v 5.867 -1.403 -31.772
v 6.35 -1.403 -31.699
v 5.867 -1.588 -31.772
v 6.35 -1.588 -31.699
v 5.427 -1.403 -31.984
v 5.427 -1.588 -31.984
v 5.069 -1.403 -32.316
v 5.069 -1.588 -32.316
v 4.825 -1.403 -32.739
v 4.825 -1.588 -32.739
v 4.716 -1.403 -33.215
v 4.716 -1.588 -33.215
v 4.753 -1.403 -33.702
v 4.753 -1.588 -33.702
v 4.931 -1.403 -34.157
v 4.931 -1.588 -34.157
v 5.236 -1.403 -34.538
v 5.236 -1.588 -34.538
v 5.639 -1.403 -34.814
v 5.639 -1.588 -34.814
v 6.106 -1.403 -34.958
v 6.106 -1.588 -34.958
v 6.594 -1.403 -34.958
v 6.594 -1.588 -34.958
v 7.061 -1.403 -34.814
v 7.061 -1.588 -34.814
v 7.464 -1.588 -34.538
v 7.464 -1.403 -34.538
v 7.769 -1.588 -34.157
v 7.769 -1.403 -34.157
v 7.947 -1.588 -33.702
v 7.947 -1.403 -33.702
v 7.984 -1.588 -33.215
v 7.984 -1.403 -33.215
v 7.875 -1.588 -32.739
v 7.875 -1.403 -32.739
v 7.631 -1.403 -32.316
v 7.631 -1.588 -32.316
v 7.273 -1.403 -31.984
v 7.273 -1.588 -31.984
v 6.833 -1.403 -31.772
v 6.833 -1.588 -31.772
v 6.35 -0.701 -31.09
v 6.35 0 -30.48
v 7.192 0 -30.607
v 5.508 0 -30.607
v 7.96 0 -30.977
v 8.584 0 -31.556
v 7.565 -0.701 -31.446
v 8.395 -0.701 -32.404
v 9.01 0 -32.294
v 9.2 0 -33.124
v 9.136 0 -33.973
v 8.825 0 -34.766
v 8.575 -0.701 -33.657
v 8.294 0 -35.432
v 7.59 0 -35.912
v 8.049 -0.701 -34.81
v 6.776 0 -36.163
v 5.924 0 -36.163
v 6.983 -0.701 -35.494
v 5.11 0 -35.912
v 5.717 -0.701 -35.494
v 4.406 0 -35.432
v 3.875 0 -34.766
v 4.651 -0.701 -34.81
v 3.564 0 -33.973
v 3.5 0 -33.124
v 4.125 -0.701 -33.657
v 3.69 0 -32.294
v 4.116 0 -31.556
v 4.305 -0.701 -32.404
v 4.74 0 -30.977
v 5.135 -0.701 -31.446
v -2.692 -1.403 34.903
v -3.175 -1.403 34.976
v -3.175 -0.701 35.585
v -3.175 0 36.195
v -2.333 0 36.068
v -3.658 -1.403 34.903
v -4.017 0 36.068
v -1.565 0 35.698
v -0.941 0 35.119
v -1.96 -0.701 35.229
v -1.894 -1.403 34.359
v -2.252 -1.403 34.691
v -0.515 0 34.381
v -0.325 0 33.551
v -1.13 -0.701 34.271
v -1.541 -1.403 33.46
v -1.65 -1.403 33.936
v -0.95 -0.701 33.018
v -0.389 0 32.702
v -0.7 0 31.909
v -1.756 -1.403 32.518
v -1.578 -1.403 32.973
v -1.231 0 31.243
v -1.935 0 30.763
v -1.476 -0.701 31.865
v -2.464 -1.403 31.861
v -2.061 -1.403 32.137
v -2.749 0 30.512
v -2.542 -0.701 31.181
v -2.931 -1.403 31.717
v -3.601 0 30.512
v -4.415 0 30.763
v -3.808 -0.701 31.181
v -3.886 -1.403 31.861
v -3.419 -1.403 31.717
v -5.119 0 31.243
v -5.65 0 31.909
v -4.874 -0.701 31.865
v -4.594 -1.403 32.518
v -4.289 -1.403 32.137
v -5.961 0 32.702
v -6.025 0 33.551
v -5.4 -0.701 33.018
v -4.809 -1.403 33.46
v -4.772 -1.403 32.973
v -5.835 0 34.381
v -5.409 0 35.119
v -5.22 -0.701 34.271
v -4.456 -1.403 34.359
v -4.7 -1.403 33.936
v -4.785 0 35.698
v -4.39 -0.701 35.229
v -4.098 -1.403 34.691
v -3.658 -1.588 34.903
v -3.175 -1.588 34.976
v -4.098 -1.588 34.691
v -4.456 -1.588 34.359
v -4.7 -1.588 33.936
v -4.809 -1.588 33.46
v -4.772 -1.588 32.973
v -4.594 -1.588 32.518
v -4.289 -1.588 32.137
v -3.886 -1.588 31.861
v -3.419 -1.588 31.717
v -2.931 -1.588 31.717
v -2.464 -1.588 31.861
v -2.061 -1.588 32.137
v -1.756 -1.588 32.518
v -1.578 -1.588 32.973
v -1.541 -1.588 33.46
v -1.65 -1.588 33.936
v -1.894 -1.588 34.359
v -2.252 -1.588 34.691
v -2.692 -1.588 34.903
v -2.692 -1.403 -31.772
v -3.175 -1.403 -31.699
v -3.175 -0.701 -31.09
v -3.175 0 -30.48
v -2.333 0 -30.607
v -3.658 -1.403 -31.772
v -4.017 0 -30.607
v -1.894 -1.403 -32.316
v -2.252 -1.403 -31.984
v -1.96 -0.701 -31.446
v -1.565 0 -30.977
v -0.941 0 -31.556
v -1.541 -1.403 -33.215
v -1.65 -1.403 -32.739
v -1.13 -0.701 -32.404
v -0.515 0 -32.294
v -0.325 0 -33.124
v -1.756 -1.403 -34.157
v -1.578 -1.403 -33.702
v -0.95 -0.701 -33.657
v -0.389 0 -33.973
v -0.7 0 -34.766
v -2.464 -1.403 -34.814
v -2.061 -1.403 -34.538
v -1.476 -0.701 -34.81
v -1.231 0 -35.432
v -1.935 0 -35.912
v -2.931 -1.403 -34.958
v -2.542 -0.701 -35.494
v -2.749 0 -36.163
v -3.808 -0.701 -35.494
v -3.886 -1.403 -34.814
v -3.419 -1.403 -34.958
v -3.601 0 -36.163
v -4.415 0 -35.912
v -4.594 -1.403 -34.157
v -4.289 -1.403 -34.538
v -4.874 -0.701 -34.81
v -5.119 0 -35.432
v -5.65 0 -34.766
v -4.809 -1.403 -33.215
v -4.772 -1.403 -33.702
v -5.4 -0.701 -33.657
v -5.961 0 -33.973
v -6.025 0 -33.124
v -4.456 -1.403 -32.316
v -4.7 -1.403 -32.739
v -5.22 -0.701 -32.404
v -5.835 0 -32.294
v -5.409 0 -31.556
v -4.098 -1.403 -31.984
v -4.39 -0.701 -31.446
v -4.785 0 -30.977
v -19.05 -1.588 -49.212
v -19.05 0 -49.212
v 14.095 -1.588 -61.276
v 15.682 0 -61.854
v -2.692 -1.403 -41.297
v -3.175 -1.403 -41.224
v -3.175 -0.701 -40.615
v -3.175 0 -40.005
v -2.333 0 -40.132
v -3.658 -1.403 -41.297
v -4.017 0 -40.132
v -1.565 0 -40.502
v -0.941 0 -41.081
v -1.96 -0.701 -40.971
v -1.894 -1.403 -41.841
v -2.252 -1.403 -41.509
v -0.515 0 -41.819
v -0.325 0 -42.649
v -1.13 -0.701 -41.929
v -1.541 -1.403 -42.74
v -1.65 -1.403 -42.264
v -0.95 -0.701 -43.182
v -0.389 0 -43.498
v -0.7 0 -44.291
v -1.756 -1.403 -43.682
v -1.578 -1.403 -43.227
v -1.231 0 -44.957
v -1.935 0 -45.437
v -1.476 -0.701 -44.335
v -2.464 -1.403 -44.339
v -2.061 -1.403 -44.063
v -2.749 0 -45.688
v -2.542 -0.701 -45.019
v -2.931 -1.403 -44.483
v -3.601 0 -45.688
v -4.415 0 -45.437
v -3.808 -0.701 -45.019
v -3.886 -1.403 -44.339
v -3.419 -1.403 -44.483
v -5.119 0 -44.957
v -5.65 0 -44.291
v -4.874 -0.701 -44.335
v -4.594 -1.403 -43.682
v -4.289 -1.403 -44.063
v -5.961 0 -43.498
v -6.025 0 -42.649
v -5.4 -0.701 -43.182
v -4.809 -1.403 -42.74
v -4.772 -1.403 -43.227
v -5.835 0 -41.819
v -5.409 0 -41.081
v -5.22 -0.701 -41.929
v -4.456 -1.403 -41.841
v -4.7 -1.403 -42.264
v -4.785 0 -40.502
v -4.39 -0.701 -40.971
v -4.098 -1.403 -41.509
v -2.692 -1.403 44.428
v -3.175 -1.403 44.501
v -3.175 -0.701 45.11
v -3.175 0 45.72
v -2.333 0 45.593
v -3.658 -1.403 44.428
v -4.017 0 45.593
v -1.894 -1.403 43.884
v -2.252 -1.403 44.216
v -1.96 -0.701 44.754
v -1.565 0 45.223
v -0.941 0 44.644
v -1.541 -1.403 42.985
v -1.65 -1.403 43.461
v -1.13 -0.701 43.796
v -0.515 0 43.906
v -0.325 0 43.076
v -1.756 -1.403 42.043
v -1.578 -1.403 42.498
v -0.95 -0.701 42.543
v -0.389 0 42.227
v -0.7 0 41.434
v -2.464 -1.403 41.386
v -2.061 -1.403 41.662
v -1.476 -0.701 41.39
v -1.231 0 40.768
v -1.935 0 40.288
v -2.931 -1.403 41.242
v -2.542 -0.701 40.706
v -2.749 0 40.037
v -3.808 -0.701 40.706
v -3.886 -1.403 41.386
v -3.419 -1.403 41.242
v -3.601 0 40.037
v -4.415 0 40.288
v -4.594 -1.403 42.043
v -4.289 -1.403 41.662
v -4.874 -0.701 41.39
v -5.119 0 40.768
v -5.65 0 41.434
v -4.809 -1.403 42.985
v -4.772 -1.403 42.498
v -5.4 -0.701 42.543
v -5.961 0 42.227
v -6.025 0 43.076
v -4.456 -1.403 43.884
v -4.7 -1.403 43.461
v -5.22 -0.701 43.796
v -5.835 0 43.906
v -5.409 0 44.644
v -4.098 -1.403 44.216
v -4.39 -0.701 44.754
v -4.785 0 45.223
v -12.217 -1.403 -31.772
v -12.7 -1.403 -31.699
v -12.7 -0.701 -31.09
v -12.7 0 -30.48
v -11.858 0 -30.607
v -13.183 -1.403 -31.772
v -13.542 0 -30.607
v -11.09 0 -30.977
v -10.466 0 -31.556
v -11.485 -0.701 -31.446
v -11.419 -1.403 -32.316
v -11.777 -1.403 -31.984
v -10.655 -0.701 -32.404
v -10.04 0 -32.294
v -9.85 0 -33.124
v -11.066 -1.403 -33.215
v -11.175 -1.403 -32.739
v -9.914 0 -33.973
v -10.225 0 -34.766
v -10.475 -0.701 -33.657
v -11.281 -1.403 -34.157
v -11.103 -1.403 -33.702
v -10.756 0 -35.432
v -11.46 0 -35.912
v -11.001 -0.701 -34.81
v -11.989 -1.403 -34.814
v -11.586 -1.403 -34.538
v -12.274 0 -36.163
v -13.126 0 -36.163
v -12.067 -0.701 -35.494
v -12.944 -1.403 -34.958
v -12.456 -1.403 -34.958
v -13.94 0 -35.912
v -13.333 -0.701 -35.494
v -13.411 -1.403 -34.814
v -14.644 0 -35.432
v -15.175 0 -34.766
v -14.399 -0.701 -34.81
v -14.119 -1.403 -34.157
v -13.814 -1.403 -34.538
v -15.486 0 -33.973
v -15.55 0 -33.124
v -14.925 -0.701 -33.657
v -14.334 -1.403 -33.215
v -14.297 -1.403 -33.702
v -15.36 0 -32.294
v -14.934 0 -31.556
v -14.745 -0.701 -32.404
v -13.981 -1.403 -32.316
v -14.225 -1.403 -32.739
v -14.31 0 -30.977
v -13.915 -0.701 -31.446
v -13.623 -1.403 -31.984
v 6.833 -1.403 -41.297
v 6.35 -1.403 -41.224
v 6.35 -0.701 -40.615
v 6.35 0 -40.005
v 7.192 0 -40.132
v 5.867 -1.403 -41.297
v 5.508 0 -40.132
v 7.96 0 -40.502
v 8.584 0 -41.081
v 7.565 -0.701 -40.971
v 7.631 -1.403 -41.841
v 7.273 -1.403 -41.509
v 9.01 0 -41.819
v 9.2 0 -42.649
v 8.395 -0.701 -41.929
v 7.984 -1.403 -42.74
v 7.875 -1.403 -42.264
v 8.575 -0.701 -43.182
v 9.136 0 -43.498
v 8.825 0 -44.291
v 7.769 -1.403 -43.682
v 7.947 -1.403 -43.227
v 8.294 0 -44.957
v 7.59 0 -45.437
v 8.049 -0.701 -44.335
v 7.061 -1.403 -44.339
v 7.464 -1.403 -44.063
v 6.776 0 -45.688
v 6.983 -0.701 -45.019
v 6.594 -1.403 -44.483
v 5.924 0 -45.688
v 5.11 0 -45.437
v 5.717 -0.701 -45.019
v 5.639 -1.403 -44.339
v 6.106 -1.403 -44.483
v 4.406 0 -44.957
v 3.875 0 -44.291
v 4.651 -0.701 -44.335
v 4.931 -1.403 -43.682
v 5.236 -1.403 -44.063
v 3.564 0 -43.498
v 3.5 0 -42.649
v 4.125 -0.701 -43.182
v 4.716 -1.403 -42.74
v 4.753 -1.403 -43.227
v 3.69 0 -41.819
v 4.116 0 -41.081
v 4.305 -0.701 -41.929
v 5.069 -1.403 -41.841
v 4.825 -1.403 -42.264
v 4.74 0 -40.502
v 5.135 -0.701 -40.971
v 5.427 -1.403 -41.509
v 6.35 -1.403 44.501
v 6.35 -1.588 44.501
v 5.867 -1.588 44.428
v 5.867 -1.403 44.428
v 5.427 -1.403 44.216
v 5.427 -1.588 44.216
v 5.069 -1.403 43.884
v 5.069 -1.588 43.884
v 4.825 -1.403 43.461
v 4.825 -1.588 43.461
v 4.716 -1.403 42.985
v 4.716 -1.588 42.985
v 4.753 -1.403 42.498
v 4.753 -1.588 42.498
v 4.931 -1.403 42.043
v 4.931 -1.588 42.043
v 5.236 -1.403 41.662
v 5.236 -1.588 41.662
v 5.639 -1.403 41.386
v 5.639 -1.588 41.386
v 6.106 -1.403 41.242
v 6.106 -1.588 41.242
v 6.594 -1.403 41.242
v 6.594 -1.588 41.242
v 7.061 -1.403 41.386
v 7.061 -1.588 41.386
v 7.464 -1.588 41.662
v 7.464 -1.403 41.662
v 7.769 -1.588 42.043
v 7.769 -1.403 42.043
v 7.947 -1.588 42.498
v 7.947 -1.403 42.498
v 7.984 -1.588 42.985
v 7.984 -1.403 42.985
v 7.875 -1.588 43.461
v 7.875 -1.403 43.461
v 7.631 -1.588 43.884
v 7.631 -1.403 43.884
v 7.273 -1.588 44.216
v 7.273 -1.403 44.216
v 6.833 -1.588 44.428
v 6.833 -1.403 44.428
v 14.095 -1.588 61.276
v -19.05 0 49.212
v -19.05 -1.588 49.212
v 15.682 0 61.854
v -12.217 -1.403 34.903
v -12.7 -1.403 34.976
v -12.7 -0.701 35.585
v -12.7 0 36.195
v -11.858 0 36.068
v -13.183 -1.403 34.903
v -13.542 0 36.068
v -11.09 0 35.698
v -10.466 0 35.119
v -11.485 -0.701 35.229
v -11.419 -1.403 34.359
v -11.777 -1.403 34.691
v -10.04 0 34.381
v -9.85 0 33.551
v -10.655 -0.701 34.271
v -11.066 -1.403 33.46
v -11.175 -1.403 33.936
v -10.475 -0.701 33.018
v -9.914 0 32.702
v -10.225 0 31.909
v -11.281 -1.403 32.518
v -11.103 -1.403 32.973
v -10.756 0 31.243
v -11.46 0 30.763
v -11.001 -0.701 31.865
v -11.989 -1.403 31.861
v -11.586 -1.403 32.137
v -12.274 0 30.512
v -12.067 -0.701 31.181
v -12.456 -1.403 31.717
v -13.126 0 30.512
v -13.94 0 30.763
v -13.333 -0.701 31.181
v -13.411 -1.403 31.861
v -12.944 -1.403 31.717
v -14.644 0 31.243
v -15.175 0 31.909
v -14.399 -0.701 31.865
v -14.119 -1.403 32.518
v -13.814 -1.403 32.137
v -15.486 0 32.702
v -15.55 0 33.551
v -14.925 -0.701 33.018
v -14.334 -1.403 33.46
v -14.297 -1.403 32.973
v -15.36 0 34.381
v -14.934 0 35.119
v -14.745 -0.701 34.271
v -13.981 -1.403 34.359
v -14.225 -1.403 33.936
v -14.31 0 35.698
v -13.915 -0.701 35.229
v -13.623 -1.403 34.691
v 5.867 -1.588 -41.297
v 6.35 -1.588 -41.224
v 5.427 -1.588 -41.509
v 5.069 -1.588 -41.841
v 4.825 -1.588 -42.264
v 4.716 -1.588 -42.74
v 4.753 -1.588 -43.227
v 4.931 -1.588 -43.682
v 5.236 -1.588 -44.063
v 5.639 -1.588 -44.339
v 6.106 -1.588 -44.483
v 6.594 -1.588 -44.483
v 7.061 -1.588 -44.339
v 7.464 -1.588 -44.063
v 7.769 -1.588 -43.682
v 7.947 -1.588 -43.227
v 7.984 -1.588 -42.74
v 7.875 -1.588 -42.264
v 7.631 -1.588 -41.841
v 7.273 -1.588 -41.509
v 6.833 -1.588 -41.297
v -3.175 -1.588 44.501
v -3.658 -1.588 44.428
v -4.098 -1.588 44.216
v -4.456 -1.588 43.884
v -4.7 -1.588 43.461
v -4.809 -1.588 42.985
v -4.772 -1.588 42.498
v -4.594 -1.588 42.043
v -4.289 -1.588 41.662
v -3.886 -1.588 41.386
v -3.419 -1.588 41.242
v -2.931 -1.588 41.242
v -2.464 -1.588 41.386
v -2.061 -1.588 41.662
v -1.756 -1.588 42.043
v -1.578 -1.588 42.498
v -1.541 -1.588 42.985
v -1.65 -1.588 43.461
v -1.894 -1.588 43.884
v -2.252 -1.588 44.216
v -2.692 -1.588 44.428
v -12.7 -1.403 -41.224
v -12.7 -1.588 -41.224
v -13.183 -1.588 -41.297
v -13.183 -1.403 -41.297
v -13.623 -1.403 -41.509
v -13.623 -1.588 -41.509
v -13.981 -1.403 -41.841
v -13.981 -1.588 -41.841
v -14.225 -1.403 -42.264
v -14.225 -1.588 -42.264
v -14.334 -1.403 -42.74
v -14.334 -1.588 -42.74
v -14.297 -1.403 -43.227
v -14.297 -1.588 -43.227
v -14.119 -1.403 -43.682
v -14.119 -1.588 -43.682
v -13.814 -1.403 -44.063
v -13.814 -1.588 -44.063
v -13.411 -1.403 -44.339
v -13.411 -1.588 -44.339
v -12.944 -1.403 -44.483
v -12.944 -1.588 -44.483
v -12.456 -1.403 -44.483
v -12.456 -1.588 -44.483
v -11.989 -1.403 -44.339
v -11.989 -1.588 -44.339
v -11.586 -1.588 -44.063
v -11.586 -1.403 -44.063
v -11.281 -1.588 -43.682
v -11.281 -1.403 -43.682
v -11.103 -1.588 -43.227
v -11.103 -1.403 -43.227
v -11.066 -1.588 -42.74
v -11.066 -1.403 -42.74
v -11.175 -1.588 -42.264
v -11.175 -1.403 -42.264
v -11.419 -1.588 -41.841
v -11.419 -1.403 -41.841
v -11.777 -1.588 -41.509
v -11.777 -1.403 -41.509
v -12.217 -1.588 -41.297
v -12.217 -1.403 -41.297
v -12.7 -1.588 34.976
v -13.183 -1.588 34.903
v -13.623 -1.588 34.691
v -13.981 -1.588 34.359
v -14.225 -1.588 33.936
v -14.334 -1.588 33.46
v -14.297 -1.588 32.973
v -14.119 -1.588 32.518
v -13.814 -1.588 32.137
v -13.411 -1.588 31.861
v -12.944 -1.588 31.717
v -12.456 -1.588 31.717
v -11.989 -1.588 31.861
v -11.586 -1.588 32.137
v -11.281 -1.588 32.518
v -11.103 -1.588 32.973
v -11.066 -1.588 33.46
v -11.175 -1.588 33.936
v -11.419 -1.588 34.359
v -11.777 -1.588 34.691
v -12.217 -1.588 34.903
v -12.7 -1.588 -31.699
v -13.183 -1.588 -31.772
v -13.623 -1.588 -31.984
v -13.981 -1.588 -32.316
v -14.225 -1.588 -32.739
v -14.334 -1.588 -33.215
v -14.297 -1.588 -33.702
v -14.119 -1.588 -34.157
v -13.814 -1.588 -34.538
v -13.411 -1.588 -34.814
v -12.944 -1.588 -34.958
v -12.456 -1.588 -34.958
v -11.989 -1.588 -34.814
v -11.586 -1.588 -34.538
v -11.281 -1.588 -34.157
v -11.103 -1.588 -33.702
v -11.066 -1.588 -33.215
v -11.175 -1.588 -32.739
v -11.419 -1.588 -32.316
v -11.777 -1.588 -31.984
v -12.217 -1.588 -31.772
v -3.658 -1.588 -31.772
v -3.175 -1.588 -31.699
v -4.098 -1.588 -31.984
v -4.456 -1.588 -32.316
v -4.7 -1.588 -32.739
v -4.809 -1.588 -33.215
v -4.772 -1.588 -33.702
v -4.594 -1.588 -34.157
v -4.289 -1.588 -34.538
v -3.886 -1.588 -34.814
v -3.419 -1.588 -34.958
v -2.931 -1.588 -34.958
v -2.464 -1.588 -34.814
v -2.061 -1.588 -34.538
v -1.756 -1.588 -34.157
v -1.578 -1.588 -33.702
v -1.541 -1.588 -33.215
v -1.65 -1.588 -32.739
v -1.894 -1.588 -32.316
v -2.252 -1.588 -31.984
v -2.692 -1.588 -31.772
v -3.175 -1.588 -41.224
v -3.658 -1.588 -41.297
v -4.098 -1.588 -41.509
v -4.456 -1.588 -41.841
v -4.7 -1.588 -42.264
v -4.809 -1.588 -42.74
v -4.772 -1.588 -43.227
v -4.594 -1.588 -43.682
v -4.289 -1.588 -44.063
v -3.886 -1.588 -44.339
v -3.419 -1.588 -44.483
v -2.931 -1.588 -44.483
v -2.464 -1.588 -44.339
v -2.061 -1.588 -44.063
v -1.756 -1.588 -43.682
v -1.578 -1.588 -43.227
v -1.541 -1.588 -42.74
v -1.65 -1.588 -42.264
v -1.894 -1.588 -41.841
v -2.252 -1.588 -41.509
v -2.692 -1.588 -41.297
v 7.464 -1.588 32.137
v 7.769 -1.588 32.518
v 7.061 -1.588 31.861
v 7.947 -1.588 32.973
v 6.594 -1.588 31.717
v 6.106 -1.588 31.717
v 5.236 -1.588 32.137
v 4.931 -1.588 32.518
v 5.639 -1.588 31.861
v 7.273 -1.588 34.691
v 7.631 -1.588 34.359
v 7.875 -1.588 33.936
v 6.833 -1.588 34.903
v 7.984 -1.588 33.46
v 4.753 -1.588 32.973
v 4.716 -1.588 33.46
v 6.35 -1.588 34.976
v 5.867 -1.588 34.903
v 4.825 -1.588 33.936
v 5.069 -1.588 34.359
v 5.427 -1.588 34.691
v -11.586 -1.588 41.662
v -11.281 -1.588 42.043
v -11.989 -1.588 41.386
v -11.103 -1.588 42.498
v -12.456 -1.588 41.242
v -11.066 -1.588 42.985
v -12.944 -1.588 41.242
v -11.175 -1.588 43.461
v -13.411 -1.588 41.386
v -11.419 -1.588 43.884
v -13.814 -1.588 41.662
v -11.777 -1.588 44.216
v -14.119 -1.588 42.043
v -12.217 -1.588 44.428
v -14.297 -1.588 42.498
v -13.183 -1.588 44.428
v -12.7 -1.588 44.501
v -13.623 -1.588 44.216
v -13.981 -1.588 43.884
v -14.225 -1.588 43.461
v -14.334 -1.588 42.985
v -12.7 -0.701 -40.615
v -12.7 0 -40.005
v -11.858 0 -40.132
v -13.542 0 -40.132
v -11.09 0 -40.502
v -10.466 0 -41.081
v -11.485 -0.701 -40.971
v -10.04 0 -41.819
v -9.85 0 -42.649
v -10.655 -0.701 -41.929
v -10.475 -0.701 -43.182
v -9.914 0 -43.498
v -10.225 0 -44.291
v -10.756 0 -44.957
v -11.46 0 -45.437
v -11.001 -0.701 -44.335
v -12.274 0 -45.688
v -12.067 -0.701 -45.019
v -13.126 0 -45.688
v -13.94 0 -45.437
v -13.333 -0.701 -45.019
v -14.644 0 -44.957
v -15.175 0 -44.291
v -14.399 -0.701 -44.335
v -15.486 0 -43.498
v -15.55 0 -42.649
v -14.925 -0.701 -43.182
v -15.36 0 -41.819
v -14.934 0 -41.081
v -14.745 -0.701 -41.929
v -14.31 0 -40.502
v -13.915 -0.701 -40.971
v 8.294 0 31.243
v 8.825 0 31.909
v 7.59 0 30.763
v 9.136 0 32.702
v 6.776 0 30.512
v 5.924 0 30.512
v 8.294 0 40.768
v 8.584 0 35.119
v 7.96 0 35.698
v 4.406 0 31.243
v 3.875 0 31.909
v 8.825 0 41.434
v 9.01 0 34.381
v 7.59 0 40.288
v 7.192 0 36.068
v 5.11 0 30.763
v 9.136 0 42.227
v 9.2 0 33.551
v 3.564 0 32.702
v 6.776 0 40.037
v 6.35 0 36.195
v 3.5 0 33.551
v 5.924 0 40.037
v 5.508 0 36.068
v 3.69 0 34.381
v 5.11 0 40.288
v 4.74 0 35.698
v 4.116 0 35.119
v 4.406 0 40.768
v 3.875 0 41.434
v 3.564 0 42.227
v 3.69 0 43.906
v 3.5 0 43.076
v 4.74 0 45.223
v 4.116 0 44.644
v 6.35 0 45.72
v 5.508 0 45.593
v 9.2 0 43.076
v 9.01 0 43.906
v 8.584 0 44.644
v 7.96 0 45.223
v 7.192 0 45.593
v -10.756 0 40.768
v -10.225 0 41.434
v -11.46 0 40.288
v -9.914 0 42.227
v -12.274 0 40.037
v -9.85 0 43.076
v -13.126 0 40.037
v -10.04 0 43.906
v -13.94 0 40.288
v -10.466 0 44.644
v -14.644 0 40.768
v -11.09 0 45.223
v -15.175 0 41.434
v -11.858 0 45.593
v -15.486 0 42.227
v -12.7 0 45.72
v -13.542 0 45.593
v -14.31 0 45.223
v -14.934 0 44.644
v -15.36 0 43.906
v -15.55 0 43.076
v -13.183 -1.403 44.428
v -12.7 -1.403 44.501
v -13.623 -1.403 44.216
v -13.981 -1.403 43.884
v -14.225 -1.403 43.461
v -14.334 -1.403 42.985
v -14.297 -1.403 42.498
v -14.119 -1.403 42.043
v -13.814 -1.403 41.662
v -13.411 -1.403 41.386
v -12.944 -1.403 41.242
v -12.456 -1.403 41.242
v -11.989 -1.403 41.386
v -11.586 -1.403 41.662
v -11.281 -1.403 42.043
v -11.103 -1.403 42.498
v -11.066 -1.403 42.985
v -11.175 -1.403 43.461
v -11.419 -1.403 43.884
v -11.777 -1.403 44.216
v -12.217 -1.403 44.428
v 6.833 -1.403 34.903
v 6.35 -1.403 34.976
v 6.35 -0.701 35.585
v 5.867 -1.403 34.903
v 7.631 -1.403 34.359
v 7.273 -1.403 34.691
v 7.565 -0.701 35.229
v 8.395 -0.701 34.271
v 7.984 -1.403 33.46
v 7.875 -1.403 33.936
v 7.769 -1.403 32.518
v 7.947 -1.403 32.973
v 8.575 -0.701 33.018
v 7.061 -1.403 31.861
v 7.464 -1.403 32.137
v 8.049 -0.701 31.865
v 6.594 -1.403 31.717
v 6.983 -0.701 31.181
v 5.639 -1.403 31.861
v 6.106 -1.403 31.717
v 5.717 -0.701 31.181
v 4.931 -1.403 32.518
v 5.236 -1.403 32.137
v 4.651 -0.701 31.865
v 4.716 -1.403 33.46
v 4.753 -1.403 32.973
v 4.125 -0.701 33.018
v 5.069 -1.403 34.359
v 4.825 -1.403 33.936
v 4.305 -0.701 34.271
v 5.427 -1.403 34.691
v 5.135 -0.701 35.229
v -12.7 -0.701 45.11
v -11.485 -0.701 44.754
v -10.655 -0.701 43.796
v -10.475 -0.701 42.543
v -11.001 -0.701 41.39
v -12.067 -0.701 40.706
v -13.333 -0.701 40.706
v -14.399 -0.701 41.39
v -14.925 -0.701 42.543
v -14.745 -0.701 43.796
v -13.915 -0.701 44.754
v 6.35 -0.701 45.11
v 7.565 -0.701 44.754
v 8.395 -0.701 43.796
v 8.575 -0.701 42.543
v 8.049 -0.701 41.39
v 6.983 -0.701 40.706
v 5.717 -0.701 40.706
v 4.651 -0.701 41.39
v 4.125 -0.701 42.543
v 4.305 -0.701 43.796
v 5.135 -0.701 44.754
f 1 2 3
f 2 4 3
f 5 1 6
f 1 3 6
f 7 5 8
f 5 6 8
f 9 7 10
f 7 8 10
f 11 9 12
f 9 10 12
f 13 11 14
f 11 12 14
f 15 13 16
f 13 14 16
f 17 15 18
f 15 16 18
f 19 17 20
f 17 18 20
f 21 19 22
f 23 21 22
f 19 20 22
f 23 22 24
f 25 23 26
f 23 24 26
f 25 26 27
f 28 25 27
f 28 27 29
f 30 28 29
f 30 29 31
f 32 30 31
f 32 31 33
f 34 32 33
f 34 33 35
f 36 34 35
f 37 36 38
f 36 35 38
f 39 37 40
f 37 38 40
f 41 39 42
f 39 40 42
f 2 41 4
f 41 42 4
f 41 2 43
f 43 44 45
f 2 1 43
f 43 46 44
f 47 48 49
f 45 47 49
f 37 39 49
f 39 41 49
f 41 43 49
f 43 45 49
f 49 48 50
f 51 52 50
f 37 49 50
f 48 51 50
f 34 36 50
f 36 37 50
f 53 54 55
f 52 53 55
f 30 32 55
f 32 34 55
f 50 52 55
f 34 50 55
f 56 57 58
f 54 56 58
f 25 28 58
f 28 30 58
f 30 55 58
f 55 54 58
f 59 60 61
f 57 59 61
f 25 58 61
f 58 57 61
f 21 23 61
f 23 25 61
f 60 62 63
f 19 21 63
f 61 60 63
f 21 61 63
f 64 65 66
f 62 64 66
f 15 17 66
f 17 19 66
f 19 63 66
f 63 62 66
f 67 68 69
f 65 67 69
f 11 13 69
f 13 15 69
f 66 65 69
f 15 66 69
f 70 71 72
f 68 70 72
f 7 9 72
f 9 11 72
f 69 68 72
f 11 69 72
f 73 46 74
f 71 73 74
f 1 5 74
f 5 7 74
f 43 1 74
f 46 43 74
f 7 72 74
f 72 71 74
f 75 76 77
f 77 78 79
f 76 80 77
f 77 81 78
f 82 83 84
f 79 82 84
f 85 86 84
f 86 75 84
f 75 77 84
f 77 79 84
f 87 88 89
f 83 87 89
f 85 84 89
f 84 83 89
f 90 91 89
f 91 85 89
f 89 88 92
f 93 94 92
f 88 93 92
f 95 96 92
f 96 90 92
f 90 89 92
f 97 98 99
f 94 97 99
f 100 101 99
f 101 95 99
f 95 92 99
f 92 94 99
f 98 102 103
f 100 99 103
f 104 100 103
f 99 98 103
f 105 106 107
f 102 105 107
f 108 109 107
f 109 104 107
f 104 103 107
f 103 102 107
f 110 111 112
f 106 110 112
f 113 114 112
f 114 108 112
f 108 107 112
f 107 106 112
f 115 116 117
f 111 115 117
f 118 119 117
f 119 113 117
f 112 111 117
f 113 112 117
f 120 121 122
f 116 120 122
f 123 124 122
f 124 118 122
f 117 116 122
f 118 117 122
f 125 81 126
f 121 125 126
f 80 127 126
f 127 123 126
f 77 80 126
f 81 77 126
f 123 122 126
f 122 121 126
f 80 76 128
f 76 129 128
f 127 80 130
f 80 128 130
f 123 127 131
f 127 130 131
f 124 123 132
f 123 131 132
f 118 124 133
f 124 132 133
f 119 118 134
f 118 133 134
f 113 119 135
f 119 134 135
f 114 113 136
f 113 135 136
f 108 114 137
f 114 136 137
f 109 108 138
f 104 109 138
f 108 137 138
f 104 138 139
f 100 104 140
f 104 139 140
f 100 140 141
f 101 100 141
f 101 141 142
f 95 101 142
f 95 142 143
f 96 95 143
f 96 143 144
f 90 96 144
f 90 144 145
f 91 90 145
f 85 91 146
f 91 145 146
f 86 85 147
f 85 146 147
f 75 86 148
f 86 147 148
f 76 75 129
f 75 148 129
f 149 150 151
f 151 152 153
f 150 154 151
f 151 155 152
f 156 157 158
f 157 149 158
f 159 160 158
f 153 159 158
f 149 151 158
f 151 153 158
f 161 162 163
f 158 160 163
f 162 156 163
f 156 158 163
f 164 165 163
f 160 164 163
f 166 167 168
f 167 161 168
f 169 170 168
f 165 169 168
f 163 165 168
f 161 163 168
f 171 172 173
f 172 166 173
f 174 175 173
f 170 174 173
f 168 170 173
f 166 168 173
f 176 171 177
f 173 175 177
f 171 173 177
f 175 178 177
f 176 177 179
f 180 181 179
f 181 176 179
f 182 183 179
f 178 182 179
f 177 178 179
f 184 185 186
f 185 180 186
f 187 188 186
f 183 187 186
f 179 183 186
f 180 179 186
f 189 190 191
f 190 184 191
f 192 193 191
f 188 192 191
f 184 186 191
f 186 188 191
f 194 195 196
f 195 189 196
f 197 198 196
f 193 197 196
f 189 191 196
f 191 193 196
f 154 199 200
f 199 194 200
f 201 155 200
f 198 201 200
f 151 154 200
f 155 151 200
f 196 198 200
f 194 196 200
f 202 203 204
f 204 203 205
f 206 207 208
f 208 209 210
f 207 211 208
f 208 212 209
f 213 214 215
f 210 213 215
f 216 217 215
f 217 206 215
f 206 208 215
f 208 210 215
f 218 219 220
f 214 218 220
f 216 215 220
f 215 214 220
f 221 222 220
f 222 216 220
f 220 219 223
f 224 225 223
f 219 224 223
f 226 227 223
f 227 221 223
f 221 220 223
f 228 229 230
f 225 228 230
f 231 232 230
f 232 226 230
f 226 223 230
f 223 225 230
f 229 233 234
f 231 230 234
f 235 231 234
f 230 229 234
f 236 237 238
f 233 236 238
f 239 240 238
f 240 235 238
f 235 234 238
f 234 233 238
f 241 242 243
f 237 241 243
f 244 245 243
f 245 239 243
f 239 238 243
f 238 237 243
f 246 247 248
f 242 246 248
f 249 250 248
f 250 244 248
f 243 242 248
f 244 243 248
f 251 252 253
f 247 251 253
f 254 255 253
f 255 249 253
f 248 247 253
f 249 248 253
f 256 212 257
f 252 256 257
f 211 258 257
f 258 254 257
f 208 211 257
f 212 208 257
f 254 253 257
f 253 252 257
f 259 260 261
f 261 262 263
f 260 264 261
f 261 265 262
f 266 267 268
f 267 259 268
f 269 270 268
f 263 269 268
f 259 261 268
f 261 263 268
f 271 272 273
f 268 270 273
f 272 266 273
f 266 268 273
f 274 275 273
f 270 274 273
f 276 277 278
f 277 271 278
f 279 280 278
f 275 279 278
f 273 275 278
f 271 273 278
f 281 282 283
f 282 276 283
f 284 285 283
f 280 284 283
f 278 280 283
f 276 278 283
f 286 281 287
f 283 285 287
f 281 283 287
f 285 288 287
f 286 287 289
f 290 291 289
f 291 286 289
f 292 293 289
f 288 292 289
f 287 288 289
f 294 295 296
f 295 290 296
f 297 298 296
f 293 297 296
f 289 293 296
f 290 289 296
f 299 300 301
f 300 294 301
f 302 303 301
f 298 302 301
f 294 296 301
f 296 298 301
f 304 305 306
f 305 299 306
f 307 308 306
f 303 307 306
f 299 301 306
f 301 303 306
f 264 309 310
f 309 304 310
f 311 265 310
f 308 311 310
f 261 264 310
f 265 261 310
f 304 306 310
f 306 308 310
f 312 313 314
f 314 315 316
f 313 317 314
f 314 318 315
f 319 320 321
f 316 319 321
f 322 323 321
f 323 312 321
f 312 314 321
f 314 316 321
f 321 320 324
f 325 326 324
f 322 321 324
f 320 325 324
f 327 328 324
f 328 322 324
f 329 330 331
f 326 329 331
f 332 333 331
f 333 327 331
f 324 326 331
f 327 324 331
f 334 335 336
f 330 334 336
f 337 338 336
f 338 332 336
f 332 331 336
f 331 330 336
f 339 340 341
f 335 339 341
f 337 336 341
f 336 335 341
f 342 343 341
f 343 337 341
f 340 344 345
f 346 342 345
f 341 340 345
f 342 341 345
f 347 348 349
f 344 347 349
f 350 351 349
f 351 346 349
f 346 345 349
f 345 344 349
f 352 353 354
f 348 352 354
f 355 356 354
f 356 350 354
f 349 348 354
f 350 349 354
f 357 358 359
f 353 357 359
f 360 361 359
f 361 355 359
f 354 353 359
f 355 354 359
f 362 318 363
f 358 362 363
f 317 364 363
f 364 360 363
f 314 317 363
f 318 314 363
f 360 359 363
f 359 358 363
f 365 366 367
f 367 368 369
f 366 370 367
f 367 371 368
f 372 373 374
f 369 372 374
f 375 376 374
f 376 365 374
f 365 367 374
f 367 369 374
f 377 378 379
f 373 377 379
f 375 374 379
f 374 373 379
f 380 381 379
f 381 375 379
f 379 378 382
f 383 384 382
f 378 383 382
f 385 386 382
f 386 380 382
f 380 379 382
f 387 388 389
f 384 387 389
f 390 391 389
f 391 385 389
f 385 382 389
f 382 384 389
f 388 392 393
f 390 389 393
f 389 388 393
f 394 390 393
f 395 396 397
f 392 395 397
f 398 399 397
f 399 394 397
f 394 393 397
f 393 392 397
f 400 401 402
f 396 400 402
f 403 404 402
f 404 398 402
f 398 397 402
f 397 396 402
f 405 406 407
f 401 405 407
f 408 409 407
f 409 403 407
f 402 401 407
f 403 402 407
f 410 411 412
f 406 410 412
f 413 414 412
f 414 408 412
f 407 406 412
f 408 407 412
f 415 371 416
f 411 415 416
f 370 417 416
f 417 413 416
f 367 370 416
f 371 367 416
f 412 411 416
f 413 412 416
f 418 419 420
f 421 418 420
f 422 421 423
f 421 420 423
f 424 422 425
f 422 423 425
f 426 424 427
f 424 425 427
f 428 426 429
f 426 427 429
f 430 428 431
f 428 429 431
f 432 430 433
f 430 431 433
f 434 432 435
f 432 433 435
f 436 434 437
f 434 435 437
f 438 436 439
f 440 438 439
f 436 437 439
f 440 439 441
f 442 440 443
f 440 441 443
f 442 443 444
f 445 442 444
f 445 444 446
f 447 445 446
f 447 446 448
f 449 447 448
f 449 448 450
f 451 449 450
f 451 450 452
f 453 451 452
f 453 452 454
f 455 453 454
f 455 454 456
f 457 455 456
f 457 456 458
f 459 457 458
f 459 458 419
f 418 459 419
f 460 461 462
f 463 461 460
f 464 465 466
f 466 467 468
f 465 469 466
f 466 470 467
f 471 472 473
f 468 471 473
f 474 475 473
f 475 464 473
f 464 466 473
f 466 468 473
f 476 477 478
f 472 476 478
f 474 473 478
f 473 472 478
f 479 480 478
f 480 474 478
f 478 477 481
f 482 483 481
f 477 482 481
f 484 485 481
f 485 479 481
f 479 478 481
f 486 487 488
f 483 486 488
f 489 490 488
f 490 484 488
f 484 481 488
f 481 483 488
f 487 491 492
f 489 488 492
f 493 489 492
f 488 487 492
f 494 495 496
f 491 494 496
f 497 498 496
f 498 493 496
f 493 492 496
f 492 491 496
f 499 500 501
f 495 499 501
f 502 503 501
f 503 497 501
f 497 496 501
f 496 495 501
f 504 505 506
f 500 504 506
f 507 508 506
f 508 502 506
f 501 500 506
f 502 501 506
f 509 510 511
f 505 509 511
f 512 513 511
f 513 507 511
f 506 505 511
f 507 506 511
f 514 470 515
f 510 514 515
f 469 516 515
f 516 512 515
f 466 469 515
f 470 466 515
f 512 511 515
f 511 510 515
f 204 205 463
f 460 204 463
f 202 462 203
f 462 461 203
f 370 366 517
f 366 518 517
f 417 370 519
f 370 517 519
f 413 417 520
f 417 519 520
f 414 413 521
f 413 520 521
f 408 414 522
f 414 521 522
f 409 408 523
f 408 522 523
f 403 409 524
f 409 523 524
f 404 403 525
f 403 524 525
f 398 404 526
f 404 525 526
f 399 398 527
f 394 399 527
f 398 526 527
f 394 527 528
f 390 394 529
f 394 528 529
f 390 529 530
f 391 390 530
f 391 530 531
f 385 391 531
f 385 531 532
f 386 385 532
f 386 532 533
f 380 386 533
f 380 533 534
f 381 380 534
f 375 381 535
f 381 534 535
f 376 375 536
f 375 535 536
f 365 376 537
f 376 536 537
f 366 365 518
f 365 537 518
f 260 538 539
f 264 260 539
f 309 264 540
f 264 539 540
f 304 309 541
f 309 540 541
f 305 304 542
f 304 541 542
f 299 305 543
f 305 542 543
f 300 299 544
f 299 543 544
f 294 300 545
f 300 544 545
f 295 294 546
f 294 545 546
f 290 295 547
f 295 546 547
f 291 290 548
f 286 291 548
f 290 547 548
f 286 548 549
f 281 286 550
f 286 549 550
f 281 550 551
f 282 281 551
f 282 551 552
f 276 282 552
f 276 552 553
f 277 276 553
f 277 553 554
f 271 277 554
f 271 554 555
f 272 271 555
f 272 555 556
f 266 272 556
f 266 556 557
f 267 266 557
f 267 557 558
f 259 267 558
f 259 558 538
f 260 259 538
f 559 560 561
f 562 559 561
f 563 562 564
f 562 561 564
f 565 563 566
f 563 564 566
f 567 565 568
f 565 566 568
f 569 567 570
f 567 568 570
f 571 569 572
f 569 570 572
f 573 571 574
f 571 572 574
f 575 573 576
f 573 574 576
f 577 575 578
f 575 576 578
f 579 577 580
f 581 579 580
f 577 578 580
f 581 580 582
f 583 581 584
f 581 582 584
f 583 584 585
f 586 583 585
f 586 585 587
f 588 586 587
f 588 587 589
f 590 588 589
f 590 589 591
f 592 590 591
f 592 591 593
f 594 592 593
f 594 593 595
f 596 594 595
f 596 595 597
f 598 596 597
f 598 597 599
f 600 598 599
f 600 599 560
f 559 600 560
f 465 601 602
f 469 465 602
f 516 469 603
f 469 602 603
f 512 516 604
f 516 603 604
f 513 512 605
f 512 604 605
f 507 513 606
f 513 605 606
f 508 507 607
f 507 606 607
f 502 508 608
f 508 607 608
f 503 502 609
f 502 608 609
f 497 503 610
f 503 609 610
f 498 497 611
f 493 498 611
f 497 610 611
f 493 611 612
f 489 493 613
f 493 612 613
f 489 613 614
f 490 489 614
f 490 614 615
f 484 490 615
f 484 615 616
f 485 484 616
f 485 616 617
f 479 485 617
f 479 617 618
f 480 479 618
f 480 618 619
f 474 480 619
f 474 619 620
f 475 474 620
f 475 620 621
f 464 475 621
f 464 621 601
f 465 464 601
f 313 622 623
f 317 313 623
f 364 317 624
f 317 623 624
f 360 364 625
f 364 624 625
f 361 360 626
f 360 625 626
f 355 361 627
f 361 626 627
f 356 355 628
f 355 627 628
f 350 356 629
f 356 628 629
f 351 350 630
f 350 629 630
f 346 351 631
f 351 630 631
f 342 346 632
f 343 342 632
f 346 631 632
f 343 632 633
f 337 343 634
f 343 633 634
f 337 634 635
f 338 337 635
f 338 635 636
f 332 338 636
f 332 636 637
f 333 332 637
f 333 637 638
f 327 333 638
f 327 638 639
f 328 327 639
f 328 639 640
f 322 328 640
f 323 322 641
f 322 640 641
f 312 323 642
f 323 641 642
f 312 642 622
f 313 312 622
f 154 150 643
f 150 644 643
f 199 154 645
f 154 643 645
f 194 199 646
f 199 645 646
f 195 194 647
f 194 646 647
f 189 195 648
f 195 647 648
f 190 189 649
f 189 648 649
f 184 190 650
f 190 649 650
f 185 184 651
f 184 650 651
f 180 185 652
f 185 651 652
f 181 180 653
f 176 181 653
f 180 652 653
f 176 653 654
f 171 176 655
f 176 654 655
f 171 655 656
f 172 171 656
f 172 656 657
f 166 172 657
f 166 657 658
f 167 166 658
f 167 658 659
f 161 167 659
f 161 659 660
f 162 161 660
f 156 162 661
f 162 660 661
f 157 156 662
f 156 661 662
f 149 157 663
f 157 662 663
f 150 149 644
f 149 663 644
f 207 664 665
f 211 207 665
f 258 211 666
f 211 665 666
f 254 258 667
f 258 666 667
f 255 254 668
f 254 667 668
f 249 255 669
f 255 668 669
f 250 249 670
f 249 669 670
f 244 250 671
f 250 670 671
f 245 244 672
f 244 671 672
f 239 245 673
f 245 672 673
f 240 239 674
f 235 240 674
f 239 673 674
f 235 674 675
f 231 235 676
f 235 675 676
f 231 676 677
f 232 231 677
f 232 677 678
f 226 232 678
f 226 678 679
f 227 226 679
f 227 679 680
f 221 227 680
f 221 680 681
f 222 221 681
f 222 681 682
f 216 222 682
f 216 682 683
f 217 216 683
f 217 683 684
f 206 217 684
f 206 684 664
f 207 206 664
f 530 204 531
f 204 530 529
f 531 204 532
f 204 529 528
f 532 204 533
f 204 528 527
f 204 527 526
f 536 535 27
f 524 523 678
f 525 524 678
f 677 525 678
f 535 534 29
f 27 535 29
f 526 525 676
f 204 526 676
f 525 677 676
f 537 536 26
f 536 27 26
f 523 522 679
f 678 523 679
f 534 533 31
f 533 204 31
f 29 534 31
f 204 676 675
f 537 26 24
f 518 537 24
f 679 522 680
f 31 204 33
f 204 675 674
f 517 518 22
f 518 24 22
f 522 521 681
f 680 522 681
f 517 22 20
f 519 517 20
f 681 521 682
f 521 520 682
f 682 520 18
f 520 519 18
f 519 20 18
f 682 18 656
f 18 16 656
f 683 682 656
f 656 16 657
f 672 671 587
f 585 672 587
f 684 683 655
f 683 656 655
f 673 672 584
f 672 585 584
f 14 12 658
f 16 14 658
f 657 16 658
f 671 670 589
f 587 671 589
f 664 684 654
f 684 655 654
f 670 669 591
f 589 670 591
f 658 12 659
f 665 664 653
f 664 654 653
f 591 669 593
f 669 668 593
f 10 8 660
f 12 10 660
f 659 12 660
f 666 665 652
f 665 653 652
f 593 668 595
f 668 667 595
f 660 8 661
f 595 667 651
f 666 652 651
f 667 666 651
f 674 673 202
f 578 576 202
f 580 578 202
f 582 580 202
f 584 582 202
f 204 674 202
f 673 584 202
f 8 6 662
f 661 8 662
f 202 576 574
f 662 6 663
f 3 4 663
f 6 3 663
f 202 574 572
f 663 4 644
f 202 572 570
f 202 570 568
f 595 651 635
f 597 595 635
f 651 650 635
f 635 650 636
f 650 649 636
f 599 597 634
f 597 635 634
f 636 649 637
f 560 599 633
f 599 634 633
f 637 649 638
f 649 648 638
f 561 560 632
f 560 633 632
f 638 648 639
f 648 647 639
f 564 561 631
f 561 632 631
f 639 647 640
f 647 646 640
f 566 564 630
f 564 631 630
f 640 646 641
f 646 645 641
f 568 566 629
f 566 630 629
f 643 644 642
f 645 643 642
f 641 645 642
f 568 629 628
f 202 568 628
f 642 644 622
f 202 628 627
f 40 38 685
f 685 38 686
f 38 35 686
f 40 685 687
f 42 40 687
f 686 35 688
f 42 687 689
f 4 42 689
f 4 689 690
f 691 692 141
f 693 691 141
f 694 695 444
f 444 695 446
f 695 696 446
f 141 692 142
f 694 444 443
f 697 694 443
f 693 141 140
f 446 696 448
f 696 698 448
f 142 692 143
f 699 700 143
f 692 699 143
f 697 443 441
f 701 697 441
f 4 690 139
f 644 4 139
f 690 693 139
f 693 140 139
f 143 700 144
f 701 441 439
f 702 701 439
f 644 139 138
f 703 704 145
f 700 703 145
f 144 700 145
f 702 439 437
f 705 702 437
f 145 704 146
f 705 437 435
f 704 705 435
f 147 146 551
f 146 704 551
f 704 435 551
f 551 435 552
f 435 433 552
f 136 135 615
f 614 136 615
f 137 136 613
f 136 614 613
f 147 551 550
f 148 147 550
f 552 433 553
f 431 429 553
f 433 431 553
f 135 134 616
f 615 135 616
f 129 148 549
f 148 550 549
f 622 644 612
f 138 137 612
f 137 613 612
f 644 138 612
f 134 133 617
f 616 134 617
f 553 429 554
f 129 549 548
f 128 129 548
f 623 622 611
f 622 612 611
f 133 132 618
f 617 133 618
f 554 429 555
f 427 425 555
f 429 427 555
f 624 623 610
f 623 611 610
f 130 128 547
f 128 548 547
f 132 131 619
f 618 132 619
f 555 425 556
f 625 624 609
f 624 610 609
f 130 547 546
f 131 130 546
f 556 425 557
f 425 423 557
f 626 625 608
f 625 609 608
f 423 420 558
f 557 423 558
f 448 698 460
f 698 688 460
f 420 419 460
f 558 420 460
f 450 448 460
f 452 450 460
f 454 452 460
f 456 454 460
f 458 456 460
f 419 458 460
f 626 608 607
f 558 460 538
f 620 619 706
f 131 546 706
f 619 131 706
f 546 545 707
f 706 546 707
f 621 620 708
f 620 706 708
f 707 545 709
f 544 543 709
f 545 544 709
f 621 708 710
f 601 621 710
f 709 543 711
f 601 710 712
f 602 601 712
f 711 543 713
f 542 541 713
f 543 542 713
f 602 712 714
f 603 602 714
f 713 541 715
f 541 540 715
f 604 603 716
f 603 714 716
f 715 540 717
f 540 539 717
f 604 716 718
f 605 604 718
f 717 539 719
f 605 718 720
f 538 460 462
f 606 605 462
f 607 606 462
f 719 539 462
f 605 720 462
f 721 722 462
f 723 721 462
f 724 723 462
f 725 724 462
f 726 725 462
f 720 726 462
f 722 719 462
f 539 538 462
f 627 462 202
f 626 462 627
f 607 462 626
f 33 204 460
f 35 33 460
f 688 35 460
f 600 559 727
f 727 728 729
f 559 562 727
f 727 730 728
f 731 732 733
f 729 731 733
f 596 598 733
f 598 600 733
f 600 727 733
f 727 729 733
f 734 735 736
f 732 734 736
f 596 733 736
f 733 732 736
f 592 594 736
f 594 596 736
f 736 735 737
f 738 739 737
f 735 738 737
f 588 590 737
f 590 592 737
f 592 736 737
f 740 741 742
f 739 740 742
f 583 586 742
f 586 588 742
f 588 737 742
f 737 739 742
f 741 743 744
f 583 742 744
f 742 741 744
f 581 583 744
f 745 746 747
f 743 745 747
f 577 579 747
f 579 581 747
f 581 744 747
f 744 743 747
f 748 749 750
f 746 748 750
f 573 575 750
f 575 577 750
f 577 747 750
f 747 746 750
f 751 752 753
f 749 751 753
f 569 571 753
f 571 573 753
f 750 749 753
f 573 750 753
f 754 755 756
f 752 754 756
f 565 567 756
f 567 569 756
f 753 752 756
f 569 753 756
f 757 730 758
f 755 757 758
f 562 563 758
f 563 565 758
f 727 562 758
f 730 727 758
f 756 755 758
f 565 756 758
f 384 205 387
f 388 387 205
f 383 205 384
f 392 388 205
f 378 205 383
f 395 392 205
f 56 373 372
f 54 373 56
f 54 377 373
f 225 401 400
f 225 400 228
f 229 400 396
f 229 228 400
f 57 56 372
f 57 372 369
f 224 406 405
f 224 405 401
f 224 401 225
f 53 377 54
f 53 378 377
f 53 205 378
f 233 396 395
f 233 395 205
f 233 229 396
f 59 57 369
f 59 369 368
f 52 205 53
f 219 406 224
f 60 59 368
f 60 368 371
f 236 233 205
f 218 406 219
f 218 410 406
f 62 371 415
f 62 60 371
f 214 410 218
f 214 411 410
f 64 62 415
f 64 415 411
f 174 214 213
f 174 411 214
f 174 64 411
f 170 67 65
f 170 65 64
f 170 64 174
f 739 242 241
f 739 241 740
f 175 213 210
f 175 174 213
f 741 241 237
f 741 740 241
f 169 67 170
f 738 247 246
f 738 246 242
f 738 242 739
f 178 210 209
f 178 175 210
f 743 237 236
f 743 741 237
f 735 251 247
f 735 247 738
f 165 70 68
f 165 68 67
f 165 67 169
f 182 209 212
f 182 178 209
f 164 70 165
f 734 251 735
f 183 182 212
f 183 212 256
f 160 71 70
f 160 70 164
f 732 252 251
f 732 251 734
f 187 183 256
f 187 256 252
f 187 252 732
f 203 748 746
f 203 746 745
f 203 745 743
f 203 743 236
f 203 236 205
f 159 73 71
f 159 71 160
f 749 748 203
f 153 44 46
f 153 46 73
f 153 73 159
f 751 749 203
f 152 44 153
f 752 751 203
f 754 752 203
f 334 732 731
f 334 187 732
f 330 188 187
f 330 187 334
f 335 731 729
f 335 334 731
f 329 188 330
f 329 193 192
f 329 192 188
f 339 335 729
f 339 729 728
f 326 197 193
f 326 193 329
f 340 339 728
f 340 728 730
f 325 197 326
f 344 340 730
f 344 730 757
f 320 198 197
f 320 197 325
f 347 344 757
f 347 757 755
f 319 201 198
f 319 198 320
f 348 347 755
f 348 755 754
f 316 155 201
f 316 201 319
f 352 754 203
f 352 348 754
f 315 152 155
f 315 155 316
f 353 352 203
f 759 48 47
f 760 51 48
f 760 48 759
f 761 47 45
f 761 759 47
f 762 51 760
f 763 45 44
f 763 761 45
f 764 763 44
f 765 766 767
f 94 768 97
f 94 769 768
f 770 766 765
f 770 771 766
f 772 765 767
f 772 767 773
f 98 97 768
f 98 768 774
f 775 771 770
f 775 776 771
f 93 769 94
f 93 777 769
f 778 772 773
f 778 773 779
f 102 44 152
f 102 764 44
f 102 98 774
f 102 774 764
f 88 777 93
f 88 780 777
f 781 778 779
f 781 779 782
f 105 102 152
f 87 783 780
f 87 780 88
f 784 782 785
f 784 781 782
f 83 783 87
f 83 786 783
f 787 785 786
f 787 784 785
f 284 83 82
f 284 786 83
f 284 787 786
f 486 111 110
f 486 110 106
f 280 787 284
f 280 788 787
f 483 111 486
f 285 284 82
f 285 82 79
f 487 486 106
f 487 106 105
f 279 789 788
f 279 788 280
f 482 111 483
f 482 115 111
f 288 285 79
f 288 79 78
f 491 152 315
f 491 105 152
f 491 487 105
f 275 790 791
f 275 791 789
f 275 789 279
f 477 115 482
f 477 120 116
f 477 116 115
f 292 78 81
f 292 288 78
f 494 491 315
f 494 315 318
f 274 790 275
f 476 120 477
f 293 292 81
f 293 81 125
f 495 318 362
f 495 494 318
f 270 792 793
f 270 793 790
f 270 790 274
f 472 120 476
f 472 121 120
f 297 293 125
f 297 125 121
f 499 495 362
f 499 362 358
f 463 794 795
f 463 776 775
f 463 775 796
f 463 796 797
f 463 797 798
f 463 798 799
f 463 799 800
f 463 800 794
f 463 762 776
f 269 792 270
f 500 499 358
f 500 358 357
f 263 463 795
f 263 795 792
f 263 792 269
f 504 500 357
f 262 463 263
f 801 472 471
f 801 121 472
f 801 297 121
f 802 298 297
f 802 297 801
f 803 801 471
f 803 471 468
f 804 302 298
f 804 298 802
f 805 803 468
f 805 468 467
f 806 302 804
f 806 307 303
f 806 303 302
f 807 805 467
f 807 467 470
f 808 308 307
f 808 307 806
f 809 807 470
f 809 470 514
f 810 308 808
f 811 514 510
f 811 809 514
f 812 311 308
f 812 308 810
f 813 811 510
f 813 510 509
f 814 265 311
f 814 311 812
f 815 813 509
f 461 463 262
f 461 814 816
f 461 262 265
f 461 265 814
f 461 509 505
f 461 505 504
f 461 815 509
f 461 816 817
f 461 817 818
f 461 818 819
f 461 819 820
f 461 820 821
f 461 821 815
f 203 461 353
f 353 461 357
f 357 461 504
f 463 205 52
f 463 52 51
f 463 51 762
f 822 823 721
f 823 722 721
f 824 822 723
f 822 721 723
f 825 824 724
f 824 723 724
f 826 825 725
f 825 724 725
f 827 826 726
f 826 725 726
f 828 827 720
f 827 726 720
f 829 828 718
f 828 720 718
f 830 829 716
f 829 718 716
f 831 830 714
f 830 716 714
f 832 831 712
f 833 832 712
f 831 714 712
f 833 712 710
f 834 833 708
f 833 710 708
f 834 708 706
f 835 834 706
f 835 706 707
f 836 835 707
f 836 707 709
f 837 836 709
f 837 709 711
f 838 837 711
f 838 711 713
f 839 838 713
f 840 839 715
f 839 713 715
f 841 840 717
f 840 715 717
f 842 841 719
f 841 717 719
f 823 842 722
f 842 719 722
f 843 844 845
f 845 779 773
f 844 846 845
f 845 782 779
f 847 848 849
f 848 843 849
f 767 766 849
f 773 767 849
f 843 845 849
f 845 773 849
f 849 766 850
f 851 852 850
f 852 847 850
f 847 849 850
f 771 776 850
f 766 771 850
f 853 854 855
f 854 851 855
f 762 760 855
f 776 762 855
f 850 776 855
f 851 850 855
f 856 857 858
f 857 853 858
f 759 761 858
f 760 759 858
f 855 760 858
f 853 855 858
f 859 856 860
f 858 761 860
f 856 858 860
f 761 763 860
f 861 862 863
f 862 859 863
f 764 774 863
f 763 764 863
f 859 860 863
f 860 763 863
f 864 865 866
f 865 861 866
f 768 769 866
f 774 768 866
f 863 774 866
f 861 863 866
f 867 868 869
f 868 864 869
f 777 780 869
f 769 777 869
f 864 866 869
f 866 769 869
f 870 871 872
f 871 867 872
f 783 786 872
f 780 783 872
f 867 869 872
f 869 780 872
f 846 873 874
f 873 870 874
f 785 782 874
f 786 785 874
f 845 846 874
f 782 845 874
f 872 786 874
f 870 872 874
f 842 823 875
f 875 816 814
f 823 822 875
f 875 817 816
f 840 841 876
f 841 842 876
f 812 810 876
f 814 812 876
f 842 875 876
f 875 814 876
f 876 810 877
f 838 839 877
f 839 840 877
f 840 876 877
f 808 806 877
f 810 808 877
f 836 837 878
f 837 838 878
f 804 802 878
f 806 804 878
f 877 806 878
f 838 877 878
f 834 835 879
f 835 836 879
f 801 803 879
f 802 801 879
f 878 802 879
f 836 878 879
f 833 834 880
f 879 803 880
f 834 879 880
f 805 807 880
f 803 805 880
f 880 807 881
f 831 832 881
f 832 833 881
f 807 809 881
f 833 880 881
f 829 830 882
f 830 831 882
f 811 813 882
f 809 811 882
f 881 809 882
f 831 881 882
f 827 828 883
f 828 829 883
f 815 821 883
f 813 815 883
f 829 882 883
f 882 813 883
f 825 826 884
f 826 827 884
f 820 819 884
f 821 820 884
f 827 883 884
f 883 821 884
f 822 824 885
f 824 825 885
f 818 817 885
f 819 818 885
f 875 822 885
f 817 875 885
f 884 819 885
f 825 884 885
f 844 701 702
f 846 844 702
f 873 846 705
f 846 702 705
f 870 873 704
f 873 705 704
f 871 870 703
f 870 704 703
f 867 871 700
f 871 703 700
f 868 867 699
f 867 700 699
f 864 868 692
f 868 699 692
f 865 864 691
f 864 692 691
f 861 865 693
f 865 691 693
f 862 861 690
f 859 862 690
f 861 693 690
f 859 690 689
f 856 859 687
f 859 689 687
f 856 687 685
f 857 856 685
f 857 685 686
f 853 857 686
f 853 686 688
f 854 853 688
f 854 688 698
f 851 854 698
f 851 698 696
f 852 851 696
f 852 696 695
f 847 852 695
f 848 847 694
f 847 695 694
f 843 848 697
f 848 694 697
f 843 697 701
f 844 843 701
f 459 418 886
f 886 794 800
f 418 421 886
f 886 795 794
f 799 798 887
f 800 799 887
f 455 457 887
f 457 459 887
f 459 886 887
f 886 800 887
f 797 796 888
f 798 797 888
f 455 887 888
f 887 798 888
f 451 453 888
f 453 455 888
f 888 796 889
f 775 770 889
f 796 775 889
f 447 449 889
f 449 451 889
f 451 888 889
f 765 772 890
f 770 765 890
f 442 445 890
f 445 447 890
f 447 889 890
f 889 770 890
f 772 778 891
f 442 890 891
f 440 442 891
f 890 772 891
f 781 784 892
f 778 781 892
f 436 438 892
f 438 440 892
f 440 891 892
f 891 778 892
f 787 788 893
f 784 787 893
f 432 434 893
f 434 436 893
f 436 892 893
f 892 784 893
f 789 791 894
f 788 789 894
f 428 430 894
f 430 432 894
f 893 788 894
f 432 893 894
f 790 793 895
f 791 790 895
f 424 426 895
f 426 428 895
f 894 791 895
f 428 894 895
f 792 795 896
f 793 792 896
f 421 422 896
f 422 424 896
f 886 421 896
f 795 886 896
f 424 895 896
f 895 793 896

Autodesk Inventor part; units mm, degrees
ref_plane "YZ Plane" through (0, 0, 0) normal (1, 0, 0) x (0, 1, 0)
ref_plane "XZ Plane" through (0, 0, 0) normal (0, 1, 0) x (-1, 0, 0)
sketch "Sketch1" plane through (0, 0, 0) normal (0, 1, 0) x (-1, 0, 0)
  line L0 (-19.05, 49.2125) -> (19.05, 49.2125)
  line L1 (19.05, 49.2125) -> (19.05, -49.2125)
  line L2 (19.05, -49.2125) -> (-19.05, -49.2125)
  line L3 (-19.05, -49.2125) -> (-19.05, 49.2125)
  line L4 (-19.05, 49.2125) -> (19.05, -49.2125) construction
  line L5 (19.05, 49.2125) -> (-19.05, -49.2125) construction
  line L6 (19.05, 0) -> (-19.05, 0) construction
  line L7 (-19.05, -49.2125) -> (19.05, -49.2125) construction
  line L8 (19.05, -49.2125) -> (19.05, -87.3125)
  line L9 (19.05, -87.3125) -> (-19.05, -87.3125)
  line L10 (-19.05, -87.3125) -> (-19.05, -49.2125)
  line L11 (19.05, -49.2125) -> (-19.05, -63.0798)
  line L12 (19.05, 49.2125) -> (-19.05, 49.2125) construction
  line L13 (-19.05, 49.2125) -> (19.05, 49.2125) construction
  line L14 (19.05, 49.2125) -> (19.05, 87.3125)
  line L15 (19.05, 87.3125) -> (-19.05, 87.3125)
  line L16 (-19.05, 87.3125) -> (-19.05, 49.2125)
  line L17 (19.05, 49.2125) -> (-19.05, 63.0798)
  line L18 (19.05, 42.8625) -> (-19.05, 42.8625) construction
  line L19 (-19.05, -63.0798) -> (9.525, -87.3125)
  line L20 (-19.05, 63.0798) -> (9.525, 87.3125)
  point P0 (0, 0)
  point P1 (12.7, 42.8625)
  point P2 (3.175, 42.8625)
  point P3 (-6.35, 42.8625)
  point P4 (12.7, 33.3375)
  point P5 (3.175, 33.3375)
  point P6 (-6.35, 33.3375)
  point P7 (12.7, -42.8625)
  point P8 (3.175, -42.8625)
  point P9 (-6.35, -42.8625)
  point P10 (12.7, -33.3375)
  point P11 (3.175, -33.3375)
  point P12 (-6.35, -33.3375)
  point P13 (19.05, 49.2125)
  point P14 (9.525, 87.3125)
  point P15 (19.05, 49.2125)
  point P16 (-19.05, 63.0798)
  dimension "d0" = 38.1
  dimension "d1" = 98.425
  dimension "d2" = 38.1
  dimension "d3" = 38.1
  dimension "d5" = 20
  dimension "d20" = 6.35
  dimension "d23" = 9.525
  dimension "d26" = 9.525
  dimension "d29" = 6.35
  dimension "d33" = 28.575
extrude "Extrusion1" add sketch "Sketch1" against normal blind 1.5875 contours L16 L17 L0 | L0 L1 L2 L3 | L2 L11 L10
ref_plane "Work Plane2" through (19.05, -1.5, 88.9) normal (-0.7071, -0.7071, 0) x (0, 0, 1)
feature "Bend Part3" [suppressed]
feature "Bend Part4" [suppressed]
sketch "Sketch2" plane through (19.05, -1.5, 88.9) normal (-0.7071, -0.7071, 0) x (0, 0, 1)
  line L0 (-10.6966, 1.0607) -> (-167.1034, 1.0607)
  line L1 (-167.1034, 1.0607) -> (-167.1034, -24.3393)
  line L2 (-167.1034, -24.3393) -> (-10.6966, -24.3393)
  line L3 (-10.6966, -24.3393) -> (-10.6966, 1.0607)
  line L4 (-10.6966, 1.0607) -> (-167.1034, 1.0607)
  line L5 (-167.1034, 1.0607) -> (-167.1034, 3.4419)
  line L6 (-167.1034, 3.4419) -> (-10.6966, 3.4419)
  line L7 (-10.6966, 3.4419) -> (-10.6966, 1.0607)
  point P0 (-88.9, 14.531)
  point P1 (-153.5673, 1.0607)
  point P2 (-167.1034, -7.4895)
  point P3 (-10.6966, -7.4895)
  dimension "d31" = 25.4
  dimension "d32" = 2.3813
extrude "Extrusion2" cut sketch "Sketch2" along normal through all both and the other way through all
hole "Hole1" at (-12.7, 0, 42.8625) at (-3.175, 0, 42.8625) at (6.35, 0, 42.8625) at (-12.7, 0, 33.3375) at (-3.175, 0, 33.3375) at (6.35, 0, 33.3375) at (6.35, 0, -33.3375) at (-3.175, 0, -33.3375) at (-12.7, 0, -33.3375) at (6.35, 0, -42.8625) at (-3.175, 0, -42.8625) at (-12.7, 0, -42.8625) direction (0, -1, 0) diameter 3.2766 end through all countersink diameter 5.715 countersink angle 82 clearance for "Flat Head Machine Screw (82)" size "#4" standard "Ansi Unified Screw Threads"
equation "\"d0\" = d2"
properties part number "Wedge" material "Aluminum 6061"
